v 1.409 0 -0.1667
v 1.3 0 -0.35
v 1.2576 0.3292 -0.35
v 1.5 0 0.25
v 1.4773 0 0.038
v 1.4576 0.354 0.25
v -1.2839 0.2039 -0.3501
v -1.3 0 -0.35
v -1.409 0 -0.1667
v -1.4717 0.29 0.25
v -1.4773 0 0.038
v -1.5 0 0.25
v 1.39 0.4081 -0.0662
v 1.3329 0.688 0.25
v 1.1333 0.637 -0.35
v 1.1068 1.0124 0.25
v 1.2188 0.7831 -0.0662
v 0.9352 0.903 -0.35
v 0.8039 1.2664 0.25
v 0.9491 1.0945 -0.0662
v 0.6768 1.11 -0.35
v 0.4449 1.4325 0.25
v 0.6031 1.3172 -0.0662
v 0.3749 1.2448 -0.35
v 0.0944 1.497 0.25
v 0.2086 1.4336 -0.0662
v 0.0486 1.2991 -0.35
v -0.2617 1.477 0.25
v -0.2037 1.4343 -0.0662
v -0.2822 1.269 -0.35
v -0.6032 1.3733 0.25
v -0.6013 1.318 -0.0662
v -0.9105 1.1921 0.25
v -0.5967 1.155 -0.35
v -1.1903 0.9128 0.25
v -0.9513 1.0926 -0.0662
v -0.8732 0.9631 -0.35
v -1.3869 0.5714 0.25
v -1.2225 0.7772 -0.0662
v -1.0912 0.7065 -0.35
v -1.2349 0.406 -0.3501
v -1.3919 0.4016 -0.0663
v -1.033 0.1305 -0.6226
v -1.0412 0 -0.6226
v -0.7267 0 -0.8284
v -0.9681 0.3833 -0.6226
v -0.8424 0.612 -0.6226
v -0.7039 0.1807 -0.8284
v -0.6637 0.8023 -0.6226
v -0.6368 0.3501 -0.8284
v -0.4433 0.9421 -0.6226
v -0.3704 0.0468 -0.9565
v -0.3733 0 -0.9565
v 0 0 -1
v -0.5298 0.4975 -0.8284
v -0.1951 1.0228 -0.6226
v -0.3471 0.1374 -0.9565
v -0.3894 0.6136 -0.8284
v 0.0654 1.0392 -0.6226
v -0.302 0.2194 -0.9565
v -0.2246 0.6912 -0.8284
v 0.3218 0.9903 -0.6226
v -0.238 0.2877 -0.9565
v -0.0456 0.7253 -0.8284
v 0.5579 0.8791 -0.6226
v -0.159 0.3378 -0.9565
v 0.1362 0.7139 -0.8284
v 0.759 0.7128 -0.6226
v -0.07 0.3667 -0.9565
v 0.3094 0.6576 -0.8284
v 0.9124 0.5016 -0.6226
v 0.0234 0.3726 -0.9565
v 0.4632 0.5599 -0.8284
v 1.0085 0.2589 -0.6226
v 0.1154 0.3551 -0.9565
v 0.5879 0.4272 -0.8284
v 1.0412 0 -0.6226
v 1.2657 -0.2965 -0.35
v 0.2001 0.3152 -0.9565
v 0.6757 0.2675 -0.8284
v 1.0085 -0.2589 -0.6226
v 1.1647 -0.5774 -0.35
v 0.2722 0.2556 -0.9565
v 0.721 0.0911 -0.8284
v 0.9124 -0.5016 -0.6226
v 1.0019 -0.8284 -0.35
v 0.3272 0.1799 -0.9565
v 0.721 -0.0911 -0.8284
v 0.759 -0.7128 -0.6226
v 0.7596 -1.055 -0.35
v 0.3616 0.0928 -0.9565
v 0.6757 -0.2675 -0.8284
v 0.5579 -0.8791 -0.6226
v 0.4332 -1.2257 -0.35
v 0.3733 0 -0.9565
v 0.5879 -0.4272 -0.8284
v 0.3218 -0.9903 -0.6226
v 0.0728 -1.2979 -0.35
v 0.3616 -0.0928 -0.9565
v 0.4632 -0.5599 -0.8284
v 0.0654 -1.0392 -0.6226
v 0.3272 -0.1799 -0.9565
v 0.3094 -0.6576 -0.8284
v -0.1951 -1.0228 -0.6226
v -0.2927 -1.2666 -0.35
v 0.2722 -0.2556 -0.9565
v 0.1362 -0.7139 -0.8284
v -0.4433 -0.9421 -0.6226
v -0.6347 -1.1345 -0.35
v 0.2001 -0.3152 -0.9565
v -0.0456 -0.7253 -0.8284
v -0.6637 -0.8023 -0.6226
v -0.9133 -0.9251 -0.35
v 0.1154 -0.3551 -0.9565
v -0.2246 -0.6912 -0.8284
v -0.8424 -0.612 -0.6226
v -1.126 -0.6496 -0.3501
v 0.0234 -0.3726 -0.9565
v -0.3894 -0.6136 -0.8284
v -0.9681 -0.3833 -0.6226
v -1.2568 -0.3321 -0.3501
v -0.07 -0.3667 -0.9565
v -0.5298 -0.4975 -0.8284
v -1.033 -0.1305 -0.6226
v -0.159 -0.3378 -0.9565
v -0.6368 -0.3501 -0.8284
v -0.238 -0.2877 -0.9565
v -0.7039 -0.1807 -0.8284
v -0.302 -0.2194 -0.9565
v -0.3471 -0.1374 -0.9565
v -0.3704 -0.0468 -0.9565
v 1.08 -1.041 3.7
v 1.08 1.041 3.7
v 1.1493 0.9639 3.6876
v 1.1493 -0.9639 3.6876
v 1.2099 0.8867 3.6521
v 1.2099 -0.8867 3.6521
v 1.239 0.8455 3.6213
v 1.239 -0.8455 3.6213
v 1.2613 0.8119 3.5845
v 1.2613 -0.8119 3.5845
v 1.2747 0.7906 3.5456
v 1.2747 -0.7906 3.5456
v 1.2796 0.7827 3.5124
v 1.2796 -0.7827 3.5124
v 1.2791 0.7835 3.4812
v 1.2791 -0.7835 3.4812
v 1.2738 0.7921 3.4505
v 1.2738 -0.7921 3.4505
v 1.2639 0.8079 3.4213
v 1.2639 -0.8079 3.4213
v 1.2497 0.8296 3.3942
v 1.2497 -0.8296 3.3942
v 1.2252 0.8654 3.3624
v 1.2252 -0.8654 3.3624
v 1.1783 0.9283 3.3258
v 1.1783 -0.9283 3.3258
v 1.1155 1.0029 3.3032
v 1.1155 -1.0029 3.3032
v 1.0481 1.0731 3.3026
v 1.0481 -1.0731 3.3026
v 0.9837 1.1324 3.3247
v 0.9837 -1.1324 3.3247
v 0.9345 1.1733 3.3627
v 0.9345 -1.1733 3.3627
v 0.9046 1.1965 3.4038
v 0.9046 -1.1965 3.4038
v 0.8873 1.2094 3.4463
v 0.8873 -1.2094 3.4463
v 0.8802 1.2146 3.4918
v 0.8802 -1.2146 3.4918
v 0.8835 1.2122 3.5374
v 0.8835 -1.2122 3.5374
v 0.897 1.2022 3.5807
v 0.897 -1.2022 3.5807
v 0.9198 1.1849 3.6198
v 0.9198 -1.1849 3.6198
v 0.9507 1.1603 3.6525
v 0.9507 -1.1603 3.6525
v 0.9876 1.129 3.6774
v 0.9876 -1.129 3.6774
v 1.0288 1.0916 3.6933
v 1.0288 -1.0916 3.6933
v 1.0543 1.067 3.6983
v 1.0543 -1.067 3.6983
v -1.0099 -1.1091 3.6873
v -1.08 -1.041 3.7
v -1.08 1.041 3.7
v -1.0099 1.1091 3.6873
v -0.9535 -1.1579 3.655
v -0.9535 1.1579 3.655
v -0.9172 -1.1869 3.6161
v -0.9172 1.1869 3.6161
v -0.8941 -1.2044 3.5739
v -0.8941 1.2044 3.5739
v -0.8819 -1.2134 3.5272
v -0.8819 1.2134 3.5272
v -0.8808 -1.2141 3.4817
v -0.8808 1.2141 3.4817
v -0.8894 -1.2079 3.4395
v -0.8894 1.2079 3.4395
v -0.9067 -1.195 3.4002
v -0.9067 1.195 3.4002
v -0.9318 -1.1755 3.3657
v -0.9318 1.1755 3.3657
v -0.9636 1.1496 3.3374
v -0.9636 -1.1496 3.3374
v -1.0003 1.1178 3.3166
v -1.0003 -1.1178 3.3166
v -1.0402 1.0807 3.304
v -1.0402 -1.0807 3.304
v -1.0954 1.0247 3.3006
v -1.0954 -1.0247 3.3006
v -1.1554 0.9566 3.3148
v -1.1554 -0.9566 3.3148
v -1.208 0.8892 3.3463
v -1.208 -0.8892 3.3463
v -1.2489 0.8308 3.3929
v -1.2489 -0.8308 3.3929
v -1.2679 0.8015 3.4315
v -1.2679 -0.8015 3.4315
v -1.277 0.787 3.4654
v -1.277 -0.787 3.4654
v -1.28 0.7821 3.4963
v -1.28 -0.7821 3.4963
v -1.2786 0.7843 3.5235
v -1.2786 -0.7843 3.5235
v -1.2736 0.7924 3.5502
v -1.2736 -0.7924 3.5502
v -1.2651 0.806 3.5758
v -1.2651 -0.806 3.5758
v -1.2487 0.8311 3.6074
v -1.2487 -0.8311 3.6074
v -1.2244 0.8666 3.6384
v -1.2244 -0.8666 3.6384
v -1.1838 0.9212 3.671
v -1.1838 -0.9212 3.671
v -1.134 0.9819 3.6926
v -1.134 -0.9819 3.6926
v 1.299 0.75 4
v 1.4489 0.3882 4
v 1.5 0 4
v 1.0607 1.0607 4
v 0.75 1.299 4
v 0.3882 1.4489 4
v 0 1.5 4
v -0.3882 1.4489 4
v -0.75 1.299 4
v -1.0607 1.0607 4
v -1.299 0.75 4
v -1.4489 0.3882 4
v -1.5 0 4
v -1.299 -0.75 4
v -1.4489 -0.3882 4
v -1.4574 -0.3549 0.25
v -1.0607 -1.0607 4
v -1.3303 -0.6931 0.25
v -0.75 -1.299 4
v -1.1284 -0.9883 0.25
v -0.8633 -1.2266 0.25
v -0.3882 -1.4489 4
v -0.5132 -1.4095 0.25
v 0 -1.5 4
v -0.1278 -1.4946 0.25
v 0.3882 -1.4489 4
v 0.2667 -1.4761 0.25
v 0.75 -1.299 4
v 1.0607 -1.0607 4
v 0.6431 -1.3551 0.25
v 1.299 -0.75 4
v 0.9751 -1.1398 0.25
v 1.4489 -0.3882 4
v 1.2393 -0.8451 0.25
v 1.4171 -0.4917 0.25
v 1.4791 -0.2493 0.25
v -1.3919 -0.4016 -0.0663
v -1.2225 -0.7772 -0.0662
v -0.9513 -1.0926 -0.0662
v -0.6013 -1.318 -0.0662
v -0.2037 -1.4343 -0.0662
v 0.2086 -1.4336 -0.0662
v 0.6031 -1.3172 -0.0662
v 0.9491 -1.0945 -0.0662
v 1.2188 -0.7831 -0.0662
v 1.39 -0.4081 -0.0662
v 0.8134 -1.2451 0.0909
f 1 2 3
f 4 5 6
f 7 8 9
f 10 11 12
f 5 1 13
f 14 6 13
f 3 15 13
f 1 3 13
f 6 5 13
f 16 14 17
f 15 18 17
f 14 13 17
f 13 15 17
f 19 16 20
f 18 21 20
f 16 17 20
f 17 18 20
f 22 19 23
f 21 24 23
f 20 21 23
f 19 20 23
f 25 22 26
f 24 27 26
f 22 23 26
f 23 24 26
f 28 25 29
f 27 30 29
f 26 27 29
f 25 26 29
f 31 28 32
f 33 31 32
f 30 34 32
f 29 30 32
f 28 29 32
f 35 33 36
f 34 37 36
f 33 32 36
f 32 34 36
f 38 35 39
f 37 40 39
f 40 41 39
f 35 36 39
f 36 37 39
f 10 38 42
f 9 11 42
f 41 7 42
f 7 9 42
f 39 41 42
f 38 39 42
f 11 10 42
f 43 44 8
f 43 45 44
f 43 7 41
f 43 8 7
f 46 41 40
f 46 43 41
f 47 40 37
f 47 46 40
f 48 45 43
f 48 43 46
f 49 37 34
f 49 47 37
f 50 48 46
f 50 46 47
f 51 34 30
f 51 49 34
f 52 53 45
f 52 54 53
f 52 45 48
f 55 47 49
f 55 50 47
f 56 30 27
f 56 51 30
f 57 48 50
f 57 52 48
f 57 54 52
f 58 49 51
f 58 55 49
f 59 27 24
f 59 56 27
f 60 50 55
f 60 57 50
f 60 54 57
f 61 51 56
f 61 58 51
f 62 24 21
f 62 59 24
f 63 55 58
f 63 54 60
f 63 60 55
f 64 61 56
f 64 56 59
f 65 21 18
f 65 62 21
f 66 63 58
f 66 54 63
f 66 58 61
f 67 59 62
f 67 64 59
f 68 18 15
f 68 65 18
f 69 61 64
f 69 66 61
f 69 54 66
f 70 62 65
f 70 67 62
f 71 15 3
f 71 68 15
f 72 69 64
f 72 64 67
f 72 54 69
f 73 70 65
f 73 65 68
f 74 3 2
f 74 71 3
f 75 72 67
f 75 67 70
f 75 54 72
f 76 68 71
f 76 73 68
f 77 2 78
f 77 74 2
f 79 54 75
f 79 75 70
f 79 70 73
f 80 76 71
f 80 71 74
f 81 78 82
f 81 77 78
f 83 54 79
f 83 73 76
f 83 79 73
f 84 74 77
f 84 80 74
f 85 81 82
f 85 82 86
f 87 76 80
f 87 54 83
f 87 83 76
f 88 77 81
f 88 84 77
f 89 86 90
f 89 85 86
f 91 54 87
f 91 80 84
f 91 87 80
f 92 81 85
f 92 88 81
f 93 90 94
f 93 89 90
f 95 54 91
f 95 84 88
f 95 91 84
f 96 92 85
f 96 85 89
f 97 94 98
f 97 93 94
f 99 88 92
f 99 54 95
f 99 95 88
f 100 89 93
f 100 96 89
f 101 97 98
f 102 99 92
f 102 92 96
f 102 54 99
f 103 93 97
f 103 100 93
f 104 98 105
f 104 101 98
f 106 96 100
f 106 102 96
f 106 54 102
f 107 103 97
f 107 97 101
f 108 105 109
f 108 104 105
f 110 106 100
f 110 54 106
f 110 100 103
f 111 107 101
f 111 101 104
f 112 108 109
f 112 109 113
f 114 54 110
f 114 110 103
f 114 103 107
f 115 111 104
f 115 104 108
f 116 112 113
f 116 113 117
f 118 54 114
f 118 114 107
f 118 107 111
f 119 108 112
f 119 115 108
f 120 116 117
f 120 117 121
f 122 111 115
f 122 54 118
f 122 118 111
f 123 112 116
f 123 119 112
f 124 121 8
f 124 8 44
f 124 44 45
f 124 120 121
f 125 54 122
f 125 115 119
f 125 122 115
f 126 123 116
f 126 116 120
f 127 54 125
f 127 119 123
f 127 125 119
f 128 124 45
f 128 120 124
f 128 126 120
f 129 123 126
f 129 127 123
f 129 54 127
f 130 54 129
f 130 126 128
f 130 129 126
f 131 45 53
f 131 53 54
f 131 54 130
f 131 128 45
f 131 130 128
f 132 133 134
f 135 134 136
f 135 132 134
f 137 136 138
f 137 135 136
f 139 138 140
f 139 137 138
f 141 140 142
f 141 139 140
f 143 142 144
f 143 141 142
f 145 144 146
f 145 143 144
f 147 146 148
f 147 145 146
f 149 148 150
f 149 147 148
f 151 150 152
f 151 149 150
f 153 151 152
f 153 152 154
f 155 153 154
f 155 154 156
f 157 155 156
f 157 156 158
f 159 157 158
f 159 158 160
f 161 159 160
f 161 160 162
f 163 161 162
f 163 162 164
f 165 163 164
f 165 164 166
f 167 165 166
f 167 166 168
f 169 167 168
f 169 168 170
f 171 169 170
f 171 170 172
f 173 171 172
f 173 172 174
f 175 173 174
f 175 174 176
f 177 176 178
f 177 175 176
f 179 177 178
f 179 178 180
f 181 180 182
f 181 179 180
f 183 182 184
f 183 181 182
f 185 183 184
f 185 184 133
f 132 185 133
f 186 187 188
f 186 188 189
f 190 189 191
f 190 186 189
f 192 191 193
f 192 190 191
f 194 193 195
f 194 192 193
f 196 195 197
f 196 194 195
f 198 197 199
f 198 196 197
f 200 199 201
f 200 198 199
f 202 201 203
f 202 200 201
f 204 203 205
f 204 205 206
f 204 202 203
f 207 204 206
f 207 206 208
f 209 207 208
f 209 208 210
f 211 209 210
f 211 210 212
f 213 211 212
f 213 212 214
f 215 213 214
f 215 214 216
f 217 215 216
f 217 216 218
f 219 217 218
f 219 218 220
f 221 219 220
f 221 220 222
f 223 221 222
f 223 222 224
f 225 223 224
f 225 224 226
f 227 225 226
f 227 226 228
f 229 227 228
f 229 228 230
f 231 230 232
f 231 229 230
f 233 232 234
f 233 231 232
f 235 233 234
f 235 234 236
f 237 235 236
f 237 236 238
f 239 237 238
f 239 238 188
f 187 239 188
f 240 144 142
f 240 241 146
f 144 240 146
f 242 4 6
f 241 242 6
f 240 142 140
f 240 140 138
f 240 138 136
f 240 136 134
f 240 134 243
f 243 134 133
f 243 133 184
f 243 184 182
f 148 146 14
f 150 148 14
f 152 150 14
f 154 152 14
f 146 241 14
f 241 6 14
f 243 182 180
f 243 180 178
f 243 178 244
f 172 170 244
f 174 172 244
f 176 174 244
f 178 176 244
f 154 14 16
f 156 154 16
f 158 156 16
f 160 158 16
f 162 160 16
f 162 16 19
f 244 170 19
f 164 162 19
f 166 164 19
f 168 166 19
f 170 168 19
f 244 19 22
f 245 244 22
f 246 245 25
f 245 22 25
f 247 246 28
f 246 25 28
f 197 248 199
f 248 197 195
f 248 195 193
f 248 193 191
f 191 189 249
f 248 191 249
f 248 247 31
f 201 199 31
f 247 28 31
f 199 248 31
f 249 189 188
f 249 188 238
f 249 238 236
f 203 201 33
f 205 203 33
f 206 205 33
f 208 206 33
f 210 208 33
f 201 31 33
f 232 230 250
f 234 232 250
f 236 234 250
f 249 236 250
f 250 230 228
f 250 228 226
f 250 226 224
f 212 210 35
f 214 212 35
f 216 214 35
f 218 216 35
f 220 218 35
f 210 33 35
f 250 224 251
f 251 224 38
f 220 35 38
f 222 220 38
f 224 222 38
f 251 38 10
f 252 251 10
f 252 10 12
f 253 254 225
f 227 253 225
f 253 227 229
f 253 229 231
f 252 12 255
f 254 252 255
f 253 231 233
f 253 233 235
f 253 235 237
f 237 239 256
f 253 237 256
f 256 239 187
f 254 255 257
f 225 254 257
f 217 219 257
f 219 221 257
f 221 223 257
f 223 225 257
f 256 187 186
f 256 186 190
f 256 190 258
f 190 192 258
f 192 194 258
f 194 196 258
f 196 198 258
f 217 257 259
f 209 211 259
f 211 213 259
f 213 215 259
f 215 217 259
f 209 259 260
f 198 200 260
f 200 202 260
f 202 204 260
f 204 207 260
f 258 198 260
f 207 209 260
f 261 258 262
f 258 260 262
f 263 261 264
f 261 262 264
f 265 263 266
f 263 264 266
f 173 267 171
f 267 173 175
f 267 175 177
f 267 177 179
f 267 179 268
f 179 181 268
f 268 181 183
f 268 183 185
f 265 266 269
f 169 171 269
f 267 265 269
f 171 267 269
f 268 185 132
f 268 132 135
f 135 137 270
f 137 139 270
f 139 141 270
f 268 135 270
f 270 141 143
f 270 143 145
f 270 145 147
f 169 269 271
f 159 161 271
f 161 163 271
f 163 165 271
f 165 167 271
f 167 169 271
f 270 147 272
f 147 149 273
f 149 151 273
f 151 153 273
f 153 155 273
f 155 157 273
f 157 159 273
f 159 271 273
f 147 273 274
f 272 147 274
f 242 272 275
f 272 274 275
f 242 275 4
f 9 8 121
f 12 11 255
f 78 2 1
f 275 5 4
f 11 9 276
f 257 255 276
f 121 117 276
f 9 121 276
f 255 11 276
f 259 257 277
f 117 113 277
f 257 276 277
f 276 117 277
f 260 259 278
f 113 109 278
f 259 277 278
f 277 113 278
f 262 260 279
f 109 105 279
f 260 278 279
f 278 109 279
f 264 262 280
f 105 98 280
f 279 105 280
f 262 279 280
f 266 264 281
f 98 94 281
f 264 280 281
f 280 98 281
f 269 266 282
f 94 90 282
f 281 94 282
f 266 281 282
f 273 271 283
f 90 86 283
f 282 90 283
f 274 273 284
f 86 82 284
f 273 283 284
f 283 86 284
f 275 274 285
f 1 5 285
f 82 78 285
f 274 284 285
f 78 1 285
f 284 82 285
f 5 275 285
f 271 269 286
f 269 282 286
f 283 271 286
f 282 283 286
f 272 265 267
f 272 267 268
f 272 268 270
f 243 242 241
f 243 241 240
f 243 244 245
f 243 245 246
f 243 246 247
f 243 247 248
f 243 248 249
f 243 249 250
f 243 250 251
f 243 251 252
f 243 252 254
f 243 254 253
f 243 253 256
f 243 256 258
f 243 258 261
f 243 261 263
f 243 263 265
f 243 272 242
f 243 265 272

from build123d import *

# Parameters (mm, degrees)
SKETCH1_R               = 1.5
BOSS_EXTRUDE1_DEPTH     = 4
DOME1_FACE_RADIUS       = 1.5
DOME1_HEIGHT            = 1
FILLET1_R               = 1
CUT_EXTRUDE1_DEPTH      = 5.52769433
CUT_EXTRUDE1_DEPTH_BACK = 5.52769433
SKETCH3_R               = 0.2


with BuildPart() as part:
    # Sketch1 → Boss-Extrude1 (new body)
    with BuildSketch(Plane.XY):
        Circle(SKETCH1_R)
    extrude(amount=BOSS_EXTRUDE1_DEPTH)

    # Dome1: a dome of height H over a round flat face of radius A is a cap of a sphere of radius (A * A + H * H) / (2 * H)
    dome1_r = (DOME1_FACE_RADIUS * DOME1_FACE_RADIUS + DOME1_HEIGHT * DOME1_HEIGHT) / (2 * DOME1_HEIGHT)
    dome1_base = Plane((0, 0, 0), z_dir=(0, 0, -1))
    with Locations(dome1_base.offset(DOME1_HEIGHT - dome1_r)):
        dome1_ball = Sphere(dome1_r, mode=Mode.PRIVATE)
    add(split(dome1_ball, bisect_by=dome1_base, keep=Keep.TOP, mode=Mode.PRIVATE))

    # Fillet1
    fillet1_edges = [part.edges().sort_by_distance(p)[0] for p in [
        (0, 1.5, 0),
    ]]
    fillet(fillet1_edges, radius=FILLET1_R)

    # Sketch3 → Cut-Extrude1 (cut, two sides: drawn at the far end of the back side and taken through both)
    with BuildSketch(Plane(origin=(0, 0, 0), x_dir=(1, 0, 0), z_dir=(0, 1, 0)).offset(-CUT_EXTRUDE1_DEPTH_BACK)):
        with Locations(Location((1.08, -3.5, 0), (0, 0, 270))):
            Circle(SKETCH3_R)
        with Locations(Location((-1.08, -3.5, 0), (0, 0, 270))):
            Circle(SKETCH3_R)
    extrude(amount=CUT_EXTRUDE1_DEPTH + CUT_EXTRUDE1_DEPTH_BACK, mode=Mode.SUBTRACT)


solid = part.part
